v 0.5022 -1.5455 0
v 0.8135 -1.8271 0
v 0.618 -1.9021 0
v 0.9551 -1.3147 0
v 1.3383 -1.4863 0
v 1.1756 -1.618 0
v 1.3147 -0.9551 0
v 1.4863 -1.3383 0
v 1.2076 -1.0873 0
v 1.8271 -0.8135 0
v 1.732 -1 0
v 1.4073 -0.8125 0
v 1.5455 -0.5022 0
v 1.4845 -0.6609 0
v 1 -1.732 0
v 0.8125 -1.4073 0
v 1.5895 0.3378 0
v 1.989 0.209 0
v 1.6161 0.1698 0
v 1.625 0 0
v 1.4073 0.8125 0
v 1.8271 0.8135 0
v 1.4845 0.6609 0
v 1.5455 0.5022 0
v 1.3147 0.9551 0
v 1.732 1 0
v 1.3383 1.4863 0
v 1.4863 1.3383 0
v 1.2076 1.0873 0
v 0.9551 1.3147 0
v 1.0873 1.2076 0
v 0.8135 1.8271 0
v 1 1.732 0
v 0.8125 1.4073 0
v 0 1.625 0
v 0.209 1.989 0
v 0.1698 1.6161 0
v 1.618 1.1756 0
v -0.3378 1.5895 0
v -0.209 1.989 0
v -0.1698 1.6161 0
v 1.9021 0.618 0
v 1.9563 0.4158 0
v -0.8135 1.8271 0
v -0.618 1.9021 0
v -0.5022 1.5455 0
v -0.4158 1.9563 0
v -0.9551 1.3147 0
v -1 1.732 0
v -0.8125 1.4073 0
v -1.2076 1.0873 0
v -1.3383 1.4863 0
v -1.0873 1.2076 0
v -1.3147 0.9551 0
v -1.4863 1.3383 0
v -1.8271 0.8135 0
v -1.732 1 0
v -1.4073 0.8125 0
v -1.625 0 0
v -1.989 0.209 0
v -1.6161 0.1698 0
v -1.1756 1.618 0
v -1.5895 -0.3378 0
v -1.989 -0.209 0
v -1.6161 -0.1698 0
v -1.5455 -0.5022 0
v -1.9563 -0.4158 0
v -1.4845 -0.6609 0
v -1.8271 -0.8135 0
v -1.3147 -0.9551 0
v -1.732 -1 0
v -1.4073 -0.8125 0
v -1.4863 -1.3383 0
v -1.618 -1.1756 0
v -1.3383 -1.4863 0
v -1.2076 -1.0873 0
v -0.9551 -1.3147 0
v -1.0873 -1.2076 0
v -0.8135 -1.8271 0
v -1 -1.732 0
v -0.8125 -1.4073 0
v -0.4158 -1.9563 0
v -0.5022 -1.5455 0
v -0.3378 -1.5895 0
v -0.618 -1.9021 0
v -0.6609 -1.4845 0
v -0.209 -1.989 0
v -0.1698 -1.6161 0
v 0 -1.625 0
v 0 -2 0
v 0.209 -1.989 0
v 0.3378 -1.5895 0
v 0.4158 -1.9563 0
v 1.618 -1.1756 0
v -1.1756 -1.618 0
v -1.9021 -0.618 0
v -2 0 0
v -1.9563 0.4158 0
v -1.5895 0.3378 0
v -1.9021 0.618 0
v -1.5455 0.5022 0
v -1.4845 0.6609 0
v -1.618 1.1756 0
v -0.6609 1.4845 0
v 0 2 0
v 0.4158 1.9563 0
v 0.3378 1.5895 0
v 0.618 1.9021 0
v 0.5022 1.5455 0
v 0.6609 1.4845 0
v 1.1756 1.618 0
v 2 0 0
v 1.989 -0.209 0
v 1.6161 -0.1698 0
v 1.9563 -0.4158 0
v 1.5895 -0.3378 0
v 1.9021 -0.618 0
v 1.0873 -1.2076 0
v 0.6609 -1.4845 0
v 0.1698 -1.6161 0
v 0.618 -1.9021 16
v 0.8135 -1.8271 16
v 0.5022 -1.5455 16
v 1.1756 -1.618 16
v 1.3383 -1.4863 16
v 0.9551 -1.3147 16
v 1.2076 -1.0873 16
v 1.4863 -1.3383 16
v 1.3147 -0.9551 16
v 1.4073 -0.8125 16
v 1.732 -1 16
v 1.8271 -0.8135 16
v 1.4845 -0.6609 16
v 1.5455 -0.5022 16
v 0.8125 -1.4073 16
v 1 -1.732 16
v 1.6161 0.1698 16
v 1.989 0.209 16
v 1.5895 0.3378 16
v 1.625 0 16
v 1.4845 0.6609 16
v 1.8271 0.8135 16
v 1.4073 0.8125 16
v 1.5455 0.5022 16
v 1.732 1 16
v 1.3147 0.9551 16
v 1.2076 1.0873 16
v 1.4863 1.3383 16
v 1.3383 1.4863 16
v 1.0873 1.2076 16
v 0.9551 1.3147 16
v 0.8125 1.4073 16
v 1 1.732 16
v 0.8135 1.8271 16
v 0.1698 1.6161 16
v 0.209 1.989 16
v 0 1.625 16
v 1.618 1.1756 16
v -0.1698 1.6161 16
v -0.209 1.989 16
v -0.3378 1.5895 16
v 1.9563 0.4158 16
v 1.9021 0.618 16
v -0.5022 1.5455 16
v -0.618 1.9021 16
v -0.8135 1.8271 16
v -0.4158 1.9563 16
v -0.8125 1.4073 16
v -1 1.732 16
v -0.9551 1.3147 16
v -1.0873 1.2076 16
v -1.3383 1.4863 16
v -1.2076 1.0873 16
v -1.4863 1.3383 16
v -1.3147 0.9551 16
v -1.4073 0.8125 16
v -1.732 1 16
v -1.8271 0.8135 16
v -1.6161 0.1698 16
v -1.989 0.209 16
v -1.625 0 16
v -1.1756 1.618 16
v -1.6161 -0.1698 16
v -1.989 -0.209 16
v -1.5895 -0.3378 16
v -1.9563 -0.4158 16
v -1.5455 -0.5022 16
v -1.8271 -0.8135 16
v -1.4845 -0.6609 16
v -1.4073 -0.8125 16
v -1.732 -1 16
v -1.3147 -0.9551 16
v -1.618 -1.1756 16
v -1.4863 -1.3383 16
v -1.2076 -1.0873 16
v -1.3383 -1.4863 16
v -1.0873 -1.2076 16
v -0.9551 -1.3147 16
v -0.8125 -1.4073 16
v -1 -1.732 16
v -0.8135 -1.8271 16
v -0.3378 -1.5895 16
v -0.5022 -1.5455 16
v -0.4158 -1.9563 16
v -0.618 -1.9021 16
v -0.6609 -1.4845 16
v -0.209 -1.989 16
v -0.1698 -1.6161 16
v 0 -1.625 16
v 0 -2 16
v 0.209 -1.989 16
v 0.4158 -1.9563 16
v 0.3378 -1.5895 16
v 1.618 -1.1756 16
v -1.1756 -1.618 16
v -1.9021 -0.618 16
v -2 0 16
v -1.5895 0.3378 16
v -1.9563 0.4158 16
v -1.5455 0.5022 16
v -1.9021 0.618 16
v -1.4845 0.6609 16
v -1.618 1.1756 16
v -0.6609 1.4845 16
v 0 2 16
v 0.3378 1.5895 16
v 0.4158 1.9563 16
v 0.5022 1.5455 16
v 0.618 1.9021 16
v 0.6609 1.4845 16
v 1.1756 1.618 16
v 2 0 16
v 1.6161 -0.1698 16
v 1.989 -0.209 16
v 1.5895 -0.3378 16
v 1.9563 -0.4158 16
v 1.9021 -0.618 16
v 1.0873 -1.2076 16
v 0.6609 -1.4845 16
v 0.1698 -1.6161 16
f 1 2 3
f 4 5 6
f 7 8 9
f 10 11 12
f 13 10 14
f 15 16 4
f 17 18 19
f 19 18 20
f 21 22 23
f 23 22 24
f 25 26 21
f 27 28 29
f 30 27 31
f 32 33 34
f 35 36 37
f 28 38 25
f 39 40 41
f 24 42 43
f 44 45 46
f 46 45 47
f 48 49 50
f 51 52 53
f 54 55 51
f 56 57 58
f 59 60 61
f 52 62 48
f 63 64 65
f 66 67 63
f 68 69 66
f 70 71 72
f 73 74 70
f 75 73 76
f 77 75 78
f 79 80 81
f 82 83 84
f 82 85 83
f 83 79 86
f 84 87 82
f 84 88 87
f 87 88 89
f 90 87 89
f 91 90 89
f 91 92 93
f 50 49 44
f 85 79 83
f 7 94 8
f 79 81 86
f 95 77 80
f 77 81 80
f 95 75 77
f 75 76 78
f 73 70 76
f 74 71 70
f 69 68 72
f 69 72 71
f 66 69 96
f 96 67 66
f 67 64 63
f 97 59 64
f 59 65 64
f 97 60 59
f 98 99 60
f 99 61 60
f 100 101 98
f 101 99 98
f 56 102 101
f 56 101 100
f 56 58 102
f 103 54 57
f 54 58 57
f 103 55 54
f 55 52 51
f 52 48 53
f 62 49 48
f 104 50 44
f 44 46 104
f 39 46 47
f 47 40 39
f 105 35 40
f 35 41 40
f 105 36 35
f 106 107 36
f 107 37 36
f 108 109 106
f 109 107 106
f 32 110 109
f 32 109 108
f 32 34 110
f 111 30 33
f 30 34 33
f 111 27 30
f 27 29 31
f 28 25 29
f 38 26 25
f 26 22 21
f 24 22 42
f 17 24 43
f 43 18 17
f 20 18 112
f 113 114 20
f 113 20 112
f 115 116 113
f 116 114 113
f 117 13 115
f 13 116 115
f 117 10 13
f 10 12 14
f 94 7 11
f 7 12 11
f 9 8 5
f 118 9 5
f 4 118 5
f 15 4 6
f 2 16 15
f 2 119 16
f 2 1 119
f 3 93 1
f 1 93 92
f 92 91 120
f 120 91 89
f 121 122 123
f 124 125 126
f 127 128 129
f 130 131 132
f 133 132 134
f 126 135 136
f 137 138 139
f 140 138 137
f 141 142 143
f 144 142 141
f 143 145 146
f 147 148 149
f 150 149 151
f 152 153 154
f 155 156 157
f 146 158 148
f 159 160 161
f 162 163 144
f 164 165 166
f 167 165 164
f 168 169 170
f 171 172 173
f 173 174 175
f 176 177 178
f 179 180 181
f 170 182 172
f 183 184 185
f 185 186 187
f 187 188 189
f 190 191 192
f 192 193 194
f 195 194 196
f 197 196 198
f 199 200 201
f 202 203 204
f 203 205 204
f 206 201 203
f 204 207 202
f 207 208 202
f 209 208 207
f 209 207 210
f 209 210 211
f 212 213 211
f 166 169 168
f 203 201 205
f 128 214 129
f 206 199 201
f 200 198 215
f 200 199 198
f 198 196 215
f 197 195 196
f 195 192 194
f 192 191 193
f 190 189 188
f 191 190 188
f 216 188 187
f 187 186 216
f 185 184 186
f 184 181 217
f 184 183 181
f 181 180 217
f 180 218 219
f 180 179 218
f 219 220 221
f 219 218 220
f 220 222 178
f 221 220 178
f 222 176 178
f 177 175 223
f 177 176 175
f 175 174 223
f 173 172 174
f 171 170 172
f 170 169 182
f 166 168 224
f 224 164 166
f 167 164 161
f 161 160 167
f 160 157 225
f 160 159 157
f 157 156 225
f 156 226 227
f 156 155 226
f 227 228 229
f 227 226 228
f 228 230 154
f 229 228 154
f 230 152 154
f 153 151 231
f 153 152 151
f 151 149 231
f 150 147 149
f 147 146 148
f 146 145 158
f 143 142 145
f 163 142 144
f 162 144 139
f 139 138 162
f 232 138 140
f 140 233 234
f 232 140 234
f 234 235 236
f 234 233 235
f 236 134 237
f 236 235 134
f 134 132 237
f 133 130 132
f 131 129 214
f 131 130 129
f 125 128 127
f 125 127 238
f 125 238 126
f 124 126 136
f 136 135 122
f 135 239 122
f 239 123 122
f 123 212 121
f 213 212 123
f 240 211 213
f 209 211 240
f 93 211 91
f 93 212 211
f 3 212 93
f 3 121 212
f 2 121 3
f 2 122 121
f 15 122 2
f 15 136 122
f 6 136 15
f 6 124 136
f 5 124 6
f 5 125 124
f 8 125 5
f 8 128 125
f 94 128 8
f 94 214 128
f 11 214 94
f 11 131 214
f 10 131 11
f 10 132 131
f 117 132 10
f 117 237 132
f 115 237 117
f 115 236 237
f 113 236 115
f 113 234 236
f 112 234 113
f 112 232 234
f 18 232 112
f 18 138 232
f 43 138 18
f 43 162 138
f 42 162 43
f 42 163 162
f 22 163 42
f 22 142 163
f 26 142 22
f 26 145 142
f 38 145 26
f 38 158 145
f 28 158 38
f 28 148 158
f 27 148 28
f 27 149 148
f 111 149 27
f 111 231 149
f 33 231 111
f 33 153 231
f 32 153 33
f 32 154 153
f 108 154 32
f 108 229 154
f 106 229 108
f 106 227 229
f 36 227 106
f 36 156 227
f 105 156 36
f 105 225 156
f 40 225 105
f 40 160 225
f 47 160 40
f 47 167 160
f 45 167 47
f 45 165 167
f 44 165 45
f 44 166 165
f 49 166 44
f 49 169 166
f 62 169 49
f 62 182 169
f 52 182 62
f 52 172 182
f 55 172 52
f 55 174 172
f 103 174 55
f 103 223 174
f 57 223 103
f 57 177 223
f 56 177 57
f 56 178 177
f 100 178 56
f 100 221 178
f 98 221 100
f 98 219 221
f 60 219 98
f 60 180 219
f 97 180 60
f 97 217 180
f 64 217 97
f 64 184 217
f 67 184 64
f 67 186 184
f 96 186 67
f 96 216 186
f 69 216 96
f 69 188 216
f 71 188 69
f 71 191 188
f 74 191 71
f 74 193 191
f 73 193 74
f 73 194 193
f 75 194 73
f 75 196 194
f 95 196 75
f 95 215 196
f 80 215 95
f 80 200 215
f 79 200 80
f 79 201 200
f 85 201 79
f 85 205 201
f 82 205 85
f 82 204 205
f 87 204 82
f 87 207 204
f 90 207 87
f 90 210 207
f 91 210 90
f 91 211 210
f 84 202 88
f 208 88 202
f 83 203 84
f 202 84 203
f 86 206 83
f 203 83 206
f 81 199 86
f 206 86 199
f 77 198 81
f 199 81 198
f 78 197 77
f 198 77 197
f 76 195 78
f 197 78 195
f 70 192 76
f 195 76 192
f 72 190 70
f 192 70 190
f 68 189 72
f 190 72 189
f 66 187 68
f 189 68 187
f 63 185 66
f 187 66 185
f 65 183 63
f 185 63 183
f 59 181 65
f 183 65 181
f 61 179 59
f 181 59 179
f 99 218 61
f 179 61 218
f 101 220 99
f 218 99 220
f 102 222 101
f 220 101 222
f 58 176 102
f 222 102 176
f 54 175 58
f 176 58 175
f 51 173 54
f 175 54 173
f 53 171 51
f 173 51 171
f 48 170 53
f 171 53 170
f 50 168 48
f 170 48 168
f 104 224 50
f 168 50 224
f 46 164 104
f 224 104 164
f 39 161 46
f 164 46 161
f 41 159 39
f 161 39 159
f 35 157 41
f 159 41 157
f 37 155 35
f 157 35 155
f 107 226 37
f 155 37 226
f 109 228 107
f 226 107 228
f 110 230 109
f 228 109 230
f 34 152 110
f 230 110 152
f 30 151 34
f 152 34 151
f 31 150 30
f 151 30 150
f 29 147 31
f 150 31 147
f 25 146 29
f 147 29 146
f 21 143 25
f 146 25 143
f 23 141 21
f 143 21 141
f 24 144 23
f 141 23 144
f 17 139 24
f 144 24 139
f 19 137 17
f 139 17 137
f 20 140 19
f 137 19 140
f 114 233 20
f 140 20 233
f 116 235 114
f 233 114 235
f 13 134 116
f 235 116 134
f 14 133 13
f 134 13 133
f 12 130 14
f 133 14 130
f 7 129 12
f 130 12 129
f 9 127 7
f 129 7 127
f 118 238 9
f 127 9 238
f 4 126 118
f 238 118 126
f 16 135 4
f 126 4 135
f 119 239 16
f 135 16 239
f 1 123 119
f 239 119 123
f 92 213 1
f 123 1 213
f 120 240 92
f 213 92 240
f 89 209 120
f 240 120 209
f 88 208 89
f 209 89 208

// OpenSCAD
$fn=60;
build("Tube");
module build(shape)
{
    if(shape == "ScrewHole")
    {
         ScrewHole(height=16, od=4, id=3.25, insetDiameter=9.25);
    }
    if(shape == "Tube")
    {
        Tube(od=4, id=3.25, length=16);
    }
    if(shape == "ConeHollow")
    {
        ConeHollow(od1=8, od2=4, wall=2, height=16);
    }
}


module ScrewHole(height, od, id, insetDiameter)
{
    echo("ScrewHole", height=height, od=od, id=id, insetDiameter=insetDiameter);
    //translate([0, 0, height+1])
    rotate([0, 180, 0]) 
    {
        wall = od - id;
        cylinder(h=height + 1, d1=od, d2=od);;
        if(insetDiameter > id)
        {
            cylinder(h=insetDiameter, d1 = insetDiameter, d2 = 1);
        }
    }
}

module Tube(od, id, length)
{
    linear_extrude(height=length)
    {
        difference()
        {
            circle(r=od/2);
            circle(r=id/2);
        }
    }
}

module ConeHollow(od1, od2, wall, height)
{
    {
        difference()
        {
            cylinder(d1=od1, d2=od2, h=height);
            cylinder(d1=od1-wall, d2=od2-wall, h=height);
        }
    }
}

//this is generally used to visualize points.
module plot(points)
{
    for(i = points)
    {
        translate([i[0], i[1], 0]) 
        {
            circle(r=1, $fn=6);
        }
    }
}
